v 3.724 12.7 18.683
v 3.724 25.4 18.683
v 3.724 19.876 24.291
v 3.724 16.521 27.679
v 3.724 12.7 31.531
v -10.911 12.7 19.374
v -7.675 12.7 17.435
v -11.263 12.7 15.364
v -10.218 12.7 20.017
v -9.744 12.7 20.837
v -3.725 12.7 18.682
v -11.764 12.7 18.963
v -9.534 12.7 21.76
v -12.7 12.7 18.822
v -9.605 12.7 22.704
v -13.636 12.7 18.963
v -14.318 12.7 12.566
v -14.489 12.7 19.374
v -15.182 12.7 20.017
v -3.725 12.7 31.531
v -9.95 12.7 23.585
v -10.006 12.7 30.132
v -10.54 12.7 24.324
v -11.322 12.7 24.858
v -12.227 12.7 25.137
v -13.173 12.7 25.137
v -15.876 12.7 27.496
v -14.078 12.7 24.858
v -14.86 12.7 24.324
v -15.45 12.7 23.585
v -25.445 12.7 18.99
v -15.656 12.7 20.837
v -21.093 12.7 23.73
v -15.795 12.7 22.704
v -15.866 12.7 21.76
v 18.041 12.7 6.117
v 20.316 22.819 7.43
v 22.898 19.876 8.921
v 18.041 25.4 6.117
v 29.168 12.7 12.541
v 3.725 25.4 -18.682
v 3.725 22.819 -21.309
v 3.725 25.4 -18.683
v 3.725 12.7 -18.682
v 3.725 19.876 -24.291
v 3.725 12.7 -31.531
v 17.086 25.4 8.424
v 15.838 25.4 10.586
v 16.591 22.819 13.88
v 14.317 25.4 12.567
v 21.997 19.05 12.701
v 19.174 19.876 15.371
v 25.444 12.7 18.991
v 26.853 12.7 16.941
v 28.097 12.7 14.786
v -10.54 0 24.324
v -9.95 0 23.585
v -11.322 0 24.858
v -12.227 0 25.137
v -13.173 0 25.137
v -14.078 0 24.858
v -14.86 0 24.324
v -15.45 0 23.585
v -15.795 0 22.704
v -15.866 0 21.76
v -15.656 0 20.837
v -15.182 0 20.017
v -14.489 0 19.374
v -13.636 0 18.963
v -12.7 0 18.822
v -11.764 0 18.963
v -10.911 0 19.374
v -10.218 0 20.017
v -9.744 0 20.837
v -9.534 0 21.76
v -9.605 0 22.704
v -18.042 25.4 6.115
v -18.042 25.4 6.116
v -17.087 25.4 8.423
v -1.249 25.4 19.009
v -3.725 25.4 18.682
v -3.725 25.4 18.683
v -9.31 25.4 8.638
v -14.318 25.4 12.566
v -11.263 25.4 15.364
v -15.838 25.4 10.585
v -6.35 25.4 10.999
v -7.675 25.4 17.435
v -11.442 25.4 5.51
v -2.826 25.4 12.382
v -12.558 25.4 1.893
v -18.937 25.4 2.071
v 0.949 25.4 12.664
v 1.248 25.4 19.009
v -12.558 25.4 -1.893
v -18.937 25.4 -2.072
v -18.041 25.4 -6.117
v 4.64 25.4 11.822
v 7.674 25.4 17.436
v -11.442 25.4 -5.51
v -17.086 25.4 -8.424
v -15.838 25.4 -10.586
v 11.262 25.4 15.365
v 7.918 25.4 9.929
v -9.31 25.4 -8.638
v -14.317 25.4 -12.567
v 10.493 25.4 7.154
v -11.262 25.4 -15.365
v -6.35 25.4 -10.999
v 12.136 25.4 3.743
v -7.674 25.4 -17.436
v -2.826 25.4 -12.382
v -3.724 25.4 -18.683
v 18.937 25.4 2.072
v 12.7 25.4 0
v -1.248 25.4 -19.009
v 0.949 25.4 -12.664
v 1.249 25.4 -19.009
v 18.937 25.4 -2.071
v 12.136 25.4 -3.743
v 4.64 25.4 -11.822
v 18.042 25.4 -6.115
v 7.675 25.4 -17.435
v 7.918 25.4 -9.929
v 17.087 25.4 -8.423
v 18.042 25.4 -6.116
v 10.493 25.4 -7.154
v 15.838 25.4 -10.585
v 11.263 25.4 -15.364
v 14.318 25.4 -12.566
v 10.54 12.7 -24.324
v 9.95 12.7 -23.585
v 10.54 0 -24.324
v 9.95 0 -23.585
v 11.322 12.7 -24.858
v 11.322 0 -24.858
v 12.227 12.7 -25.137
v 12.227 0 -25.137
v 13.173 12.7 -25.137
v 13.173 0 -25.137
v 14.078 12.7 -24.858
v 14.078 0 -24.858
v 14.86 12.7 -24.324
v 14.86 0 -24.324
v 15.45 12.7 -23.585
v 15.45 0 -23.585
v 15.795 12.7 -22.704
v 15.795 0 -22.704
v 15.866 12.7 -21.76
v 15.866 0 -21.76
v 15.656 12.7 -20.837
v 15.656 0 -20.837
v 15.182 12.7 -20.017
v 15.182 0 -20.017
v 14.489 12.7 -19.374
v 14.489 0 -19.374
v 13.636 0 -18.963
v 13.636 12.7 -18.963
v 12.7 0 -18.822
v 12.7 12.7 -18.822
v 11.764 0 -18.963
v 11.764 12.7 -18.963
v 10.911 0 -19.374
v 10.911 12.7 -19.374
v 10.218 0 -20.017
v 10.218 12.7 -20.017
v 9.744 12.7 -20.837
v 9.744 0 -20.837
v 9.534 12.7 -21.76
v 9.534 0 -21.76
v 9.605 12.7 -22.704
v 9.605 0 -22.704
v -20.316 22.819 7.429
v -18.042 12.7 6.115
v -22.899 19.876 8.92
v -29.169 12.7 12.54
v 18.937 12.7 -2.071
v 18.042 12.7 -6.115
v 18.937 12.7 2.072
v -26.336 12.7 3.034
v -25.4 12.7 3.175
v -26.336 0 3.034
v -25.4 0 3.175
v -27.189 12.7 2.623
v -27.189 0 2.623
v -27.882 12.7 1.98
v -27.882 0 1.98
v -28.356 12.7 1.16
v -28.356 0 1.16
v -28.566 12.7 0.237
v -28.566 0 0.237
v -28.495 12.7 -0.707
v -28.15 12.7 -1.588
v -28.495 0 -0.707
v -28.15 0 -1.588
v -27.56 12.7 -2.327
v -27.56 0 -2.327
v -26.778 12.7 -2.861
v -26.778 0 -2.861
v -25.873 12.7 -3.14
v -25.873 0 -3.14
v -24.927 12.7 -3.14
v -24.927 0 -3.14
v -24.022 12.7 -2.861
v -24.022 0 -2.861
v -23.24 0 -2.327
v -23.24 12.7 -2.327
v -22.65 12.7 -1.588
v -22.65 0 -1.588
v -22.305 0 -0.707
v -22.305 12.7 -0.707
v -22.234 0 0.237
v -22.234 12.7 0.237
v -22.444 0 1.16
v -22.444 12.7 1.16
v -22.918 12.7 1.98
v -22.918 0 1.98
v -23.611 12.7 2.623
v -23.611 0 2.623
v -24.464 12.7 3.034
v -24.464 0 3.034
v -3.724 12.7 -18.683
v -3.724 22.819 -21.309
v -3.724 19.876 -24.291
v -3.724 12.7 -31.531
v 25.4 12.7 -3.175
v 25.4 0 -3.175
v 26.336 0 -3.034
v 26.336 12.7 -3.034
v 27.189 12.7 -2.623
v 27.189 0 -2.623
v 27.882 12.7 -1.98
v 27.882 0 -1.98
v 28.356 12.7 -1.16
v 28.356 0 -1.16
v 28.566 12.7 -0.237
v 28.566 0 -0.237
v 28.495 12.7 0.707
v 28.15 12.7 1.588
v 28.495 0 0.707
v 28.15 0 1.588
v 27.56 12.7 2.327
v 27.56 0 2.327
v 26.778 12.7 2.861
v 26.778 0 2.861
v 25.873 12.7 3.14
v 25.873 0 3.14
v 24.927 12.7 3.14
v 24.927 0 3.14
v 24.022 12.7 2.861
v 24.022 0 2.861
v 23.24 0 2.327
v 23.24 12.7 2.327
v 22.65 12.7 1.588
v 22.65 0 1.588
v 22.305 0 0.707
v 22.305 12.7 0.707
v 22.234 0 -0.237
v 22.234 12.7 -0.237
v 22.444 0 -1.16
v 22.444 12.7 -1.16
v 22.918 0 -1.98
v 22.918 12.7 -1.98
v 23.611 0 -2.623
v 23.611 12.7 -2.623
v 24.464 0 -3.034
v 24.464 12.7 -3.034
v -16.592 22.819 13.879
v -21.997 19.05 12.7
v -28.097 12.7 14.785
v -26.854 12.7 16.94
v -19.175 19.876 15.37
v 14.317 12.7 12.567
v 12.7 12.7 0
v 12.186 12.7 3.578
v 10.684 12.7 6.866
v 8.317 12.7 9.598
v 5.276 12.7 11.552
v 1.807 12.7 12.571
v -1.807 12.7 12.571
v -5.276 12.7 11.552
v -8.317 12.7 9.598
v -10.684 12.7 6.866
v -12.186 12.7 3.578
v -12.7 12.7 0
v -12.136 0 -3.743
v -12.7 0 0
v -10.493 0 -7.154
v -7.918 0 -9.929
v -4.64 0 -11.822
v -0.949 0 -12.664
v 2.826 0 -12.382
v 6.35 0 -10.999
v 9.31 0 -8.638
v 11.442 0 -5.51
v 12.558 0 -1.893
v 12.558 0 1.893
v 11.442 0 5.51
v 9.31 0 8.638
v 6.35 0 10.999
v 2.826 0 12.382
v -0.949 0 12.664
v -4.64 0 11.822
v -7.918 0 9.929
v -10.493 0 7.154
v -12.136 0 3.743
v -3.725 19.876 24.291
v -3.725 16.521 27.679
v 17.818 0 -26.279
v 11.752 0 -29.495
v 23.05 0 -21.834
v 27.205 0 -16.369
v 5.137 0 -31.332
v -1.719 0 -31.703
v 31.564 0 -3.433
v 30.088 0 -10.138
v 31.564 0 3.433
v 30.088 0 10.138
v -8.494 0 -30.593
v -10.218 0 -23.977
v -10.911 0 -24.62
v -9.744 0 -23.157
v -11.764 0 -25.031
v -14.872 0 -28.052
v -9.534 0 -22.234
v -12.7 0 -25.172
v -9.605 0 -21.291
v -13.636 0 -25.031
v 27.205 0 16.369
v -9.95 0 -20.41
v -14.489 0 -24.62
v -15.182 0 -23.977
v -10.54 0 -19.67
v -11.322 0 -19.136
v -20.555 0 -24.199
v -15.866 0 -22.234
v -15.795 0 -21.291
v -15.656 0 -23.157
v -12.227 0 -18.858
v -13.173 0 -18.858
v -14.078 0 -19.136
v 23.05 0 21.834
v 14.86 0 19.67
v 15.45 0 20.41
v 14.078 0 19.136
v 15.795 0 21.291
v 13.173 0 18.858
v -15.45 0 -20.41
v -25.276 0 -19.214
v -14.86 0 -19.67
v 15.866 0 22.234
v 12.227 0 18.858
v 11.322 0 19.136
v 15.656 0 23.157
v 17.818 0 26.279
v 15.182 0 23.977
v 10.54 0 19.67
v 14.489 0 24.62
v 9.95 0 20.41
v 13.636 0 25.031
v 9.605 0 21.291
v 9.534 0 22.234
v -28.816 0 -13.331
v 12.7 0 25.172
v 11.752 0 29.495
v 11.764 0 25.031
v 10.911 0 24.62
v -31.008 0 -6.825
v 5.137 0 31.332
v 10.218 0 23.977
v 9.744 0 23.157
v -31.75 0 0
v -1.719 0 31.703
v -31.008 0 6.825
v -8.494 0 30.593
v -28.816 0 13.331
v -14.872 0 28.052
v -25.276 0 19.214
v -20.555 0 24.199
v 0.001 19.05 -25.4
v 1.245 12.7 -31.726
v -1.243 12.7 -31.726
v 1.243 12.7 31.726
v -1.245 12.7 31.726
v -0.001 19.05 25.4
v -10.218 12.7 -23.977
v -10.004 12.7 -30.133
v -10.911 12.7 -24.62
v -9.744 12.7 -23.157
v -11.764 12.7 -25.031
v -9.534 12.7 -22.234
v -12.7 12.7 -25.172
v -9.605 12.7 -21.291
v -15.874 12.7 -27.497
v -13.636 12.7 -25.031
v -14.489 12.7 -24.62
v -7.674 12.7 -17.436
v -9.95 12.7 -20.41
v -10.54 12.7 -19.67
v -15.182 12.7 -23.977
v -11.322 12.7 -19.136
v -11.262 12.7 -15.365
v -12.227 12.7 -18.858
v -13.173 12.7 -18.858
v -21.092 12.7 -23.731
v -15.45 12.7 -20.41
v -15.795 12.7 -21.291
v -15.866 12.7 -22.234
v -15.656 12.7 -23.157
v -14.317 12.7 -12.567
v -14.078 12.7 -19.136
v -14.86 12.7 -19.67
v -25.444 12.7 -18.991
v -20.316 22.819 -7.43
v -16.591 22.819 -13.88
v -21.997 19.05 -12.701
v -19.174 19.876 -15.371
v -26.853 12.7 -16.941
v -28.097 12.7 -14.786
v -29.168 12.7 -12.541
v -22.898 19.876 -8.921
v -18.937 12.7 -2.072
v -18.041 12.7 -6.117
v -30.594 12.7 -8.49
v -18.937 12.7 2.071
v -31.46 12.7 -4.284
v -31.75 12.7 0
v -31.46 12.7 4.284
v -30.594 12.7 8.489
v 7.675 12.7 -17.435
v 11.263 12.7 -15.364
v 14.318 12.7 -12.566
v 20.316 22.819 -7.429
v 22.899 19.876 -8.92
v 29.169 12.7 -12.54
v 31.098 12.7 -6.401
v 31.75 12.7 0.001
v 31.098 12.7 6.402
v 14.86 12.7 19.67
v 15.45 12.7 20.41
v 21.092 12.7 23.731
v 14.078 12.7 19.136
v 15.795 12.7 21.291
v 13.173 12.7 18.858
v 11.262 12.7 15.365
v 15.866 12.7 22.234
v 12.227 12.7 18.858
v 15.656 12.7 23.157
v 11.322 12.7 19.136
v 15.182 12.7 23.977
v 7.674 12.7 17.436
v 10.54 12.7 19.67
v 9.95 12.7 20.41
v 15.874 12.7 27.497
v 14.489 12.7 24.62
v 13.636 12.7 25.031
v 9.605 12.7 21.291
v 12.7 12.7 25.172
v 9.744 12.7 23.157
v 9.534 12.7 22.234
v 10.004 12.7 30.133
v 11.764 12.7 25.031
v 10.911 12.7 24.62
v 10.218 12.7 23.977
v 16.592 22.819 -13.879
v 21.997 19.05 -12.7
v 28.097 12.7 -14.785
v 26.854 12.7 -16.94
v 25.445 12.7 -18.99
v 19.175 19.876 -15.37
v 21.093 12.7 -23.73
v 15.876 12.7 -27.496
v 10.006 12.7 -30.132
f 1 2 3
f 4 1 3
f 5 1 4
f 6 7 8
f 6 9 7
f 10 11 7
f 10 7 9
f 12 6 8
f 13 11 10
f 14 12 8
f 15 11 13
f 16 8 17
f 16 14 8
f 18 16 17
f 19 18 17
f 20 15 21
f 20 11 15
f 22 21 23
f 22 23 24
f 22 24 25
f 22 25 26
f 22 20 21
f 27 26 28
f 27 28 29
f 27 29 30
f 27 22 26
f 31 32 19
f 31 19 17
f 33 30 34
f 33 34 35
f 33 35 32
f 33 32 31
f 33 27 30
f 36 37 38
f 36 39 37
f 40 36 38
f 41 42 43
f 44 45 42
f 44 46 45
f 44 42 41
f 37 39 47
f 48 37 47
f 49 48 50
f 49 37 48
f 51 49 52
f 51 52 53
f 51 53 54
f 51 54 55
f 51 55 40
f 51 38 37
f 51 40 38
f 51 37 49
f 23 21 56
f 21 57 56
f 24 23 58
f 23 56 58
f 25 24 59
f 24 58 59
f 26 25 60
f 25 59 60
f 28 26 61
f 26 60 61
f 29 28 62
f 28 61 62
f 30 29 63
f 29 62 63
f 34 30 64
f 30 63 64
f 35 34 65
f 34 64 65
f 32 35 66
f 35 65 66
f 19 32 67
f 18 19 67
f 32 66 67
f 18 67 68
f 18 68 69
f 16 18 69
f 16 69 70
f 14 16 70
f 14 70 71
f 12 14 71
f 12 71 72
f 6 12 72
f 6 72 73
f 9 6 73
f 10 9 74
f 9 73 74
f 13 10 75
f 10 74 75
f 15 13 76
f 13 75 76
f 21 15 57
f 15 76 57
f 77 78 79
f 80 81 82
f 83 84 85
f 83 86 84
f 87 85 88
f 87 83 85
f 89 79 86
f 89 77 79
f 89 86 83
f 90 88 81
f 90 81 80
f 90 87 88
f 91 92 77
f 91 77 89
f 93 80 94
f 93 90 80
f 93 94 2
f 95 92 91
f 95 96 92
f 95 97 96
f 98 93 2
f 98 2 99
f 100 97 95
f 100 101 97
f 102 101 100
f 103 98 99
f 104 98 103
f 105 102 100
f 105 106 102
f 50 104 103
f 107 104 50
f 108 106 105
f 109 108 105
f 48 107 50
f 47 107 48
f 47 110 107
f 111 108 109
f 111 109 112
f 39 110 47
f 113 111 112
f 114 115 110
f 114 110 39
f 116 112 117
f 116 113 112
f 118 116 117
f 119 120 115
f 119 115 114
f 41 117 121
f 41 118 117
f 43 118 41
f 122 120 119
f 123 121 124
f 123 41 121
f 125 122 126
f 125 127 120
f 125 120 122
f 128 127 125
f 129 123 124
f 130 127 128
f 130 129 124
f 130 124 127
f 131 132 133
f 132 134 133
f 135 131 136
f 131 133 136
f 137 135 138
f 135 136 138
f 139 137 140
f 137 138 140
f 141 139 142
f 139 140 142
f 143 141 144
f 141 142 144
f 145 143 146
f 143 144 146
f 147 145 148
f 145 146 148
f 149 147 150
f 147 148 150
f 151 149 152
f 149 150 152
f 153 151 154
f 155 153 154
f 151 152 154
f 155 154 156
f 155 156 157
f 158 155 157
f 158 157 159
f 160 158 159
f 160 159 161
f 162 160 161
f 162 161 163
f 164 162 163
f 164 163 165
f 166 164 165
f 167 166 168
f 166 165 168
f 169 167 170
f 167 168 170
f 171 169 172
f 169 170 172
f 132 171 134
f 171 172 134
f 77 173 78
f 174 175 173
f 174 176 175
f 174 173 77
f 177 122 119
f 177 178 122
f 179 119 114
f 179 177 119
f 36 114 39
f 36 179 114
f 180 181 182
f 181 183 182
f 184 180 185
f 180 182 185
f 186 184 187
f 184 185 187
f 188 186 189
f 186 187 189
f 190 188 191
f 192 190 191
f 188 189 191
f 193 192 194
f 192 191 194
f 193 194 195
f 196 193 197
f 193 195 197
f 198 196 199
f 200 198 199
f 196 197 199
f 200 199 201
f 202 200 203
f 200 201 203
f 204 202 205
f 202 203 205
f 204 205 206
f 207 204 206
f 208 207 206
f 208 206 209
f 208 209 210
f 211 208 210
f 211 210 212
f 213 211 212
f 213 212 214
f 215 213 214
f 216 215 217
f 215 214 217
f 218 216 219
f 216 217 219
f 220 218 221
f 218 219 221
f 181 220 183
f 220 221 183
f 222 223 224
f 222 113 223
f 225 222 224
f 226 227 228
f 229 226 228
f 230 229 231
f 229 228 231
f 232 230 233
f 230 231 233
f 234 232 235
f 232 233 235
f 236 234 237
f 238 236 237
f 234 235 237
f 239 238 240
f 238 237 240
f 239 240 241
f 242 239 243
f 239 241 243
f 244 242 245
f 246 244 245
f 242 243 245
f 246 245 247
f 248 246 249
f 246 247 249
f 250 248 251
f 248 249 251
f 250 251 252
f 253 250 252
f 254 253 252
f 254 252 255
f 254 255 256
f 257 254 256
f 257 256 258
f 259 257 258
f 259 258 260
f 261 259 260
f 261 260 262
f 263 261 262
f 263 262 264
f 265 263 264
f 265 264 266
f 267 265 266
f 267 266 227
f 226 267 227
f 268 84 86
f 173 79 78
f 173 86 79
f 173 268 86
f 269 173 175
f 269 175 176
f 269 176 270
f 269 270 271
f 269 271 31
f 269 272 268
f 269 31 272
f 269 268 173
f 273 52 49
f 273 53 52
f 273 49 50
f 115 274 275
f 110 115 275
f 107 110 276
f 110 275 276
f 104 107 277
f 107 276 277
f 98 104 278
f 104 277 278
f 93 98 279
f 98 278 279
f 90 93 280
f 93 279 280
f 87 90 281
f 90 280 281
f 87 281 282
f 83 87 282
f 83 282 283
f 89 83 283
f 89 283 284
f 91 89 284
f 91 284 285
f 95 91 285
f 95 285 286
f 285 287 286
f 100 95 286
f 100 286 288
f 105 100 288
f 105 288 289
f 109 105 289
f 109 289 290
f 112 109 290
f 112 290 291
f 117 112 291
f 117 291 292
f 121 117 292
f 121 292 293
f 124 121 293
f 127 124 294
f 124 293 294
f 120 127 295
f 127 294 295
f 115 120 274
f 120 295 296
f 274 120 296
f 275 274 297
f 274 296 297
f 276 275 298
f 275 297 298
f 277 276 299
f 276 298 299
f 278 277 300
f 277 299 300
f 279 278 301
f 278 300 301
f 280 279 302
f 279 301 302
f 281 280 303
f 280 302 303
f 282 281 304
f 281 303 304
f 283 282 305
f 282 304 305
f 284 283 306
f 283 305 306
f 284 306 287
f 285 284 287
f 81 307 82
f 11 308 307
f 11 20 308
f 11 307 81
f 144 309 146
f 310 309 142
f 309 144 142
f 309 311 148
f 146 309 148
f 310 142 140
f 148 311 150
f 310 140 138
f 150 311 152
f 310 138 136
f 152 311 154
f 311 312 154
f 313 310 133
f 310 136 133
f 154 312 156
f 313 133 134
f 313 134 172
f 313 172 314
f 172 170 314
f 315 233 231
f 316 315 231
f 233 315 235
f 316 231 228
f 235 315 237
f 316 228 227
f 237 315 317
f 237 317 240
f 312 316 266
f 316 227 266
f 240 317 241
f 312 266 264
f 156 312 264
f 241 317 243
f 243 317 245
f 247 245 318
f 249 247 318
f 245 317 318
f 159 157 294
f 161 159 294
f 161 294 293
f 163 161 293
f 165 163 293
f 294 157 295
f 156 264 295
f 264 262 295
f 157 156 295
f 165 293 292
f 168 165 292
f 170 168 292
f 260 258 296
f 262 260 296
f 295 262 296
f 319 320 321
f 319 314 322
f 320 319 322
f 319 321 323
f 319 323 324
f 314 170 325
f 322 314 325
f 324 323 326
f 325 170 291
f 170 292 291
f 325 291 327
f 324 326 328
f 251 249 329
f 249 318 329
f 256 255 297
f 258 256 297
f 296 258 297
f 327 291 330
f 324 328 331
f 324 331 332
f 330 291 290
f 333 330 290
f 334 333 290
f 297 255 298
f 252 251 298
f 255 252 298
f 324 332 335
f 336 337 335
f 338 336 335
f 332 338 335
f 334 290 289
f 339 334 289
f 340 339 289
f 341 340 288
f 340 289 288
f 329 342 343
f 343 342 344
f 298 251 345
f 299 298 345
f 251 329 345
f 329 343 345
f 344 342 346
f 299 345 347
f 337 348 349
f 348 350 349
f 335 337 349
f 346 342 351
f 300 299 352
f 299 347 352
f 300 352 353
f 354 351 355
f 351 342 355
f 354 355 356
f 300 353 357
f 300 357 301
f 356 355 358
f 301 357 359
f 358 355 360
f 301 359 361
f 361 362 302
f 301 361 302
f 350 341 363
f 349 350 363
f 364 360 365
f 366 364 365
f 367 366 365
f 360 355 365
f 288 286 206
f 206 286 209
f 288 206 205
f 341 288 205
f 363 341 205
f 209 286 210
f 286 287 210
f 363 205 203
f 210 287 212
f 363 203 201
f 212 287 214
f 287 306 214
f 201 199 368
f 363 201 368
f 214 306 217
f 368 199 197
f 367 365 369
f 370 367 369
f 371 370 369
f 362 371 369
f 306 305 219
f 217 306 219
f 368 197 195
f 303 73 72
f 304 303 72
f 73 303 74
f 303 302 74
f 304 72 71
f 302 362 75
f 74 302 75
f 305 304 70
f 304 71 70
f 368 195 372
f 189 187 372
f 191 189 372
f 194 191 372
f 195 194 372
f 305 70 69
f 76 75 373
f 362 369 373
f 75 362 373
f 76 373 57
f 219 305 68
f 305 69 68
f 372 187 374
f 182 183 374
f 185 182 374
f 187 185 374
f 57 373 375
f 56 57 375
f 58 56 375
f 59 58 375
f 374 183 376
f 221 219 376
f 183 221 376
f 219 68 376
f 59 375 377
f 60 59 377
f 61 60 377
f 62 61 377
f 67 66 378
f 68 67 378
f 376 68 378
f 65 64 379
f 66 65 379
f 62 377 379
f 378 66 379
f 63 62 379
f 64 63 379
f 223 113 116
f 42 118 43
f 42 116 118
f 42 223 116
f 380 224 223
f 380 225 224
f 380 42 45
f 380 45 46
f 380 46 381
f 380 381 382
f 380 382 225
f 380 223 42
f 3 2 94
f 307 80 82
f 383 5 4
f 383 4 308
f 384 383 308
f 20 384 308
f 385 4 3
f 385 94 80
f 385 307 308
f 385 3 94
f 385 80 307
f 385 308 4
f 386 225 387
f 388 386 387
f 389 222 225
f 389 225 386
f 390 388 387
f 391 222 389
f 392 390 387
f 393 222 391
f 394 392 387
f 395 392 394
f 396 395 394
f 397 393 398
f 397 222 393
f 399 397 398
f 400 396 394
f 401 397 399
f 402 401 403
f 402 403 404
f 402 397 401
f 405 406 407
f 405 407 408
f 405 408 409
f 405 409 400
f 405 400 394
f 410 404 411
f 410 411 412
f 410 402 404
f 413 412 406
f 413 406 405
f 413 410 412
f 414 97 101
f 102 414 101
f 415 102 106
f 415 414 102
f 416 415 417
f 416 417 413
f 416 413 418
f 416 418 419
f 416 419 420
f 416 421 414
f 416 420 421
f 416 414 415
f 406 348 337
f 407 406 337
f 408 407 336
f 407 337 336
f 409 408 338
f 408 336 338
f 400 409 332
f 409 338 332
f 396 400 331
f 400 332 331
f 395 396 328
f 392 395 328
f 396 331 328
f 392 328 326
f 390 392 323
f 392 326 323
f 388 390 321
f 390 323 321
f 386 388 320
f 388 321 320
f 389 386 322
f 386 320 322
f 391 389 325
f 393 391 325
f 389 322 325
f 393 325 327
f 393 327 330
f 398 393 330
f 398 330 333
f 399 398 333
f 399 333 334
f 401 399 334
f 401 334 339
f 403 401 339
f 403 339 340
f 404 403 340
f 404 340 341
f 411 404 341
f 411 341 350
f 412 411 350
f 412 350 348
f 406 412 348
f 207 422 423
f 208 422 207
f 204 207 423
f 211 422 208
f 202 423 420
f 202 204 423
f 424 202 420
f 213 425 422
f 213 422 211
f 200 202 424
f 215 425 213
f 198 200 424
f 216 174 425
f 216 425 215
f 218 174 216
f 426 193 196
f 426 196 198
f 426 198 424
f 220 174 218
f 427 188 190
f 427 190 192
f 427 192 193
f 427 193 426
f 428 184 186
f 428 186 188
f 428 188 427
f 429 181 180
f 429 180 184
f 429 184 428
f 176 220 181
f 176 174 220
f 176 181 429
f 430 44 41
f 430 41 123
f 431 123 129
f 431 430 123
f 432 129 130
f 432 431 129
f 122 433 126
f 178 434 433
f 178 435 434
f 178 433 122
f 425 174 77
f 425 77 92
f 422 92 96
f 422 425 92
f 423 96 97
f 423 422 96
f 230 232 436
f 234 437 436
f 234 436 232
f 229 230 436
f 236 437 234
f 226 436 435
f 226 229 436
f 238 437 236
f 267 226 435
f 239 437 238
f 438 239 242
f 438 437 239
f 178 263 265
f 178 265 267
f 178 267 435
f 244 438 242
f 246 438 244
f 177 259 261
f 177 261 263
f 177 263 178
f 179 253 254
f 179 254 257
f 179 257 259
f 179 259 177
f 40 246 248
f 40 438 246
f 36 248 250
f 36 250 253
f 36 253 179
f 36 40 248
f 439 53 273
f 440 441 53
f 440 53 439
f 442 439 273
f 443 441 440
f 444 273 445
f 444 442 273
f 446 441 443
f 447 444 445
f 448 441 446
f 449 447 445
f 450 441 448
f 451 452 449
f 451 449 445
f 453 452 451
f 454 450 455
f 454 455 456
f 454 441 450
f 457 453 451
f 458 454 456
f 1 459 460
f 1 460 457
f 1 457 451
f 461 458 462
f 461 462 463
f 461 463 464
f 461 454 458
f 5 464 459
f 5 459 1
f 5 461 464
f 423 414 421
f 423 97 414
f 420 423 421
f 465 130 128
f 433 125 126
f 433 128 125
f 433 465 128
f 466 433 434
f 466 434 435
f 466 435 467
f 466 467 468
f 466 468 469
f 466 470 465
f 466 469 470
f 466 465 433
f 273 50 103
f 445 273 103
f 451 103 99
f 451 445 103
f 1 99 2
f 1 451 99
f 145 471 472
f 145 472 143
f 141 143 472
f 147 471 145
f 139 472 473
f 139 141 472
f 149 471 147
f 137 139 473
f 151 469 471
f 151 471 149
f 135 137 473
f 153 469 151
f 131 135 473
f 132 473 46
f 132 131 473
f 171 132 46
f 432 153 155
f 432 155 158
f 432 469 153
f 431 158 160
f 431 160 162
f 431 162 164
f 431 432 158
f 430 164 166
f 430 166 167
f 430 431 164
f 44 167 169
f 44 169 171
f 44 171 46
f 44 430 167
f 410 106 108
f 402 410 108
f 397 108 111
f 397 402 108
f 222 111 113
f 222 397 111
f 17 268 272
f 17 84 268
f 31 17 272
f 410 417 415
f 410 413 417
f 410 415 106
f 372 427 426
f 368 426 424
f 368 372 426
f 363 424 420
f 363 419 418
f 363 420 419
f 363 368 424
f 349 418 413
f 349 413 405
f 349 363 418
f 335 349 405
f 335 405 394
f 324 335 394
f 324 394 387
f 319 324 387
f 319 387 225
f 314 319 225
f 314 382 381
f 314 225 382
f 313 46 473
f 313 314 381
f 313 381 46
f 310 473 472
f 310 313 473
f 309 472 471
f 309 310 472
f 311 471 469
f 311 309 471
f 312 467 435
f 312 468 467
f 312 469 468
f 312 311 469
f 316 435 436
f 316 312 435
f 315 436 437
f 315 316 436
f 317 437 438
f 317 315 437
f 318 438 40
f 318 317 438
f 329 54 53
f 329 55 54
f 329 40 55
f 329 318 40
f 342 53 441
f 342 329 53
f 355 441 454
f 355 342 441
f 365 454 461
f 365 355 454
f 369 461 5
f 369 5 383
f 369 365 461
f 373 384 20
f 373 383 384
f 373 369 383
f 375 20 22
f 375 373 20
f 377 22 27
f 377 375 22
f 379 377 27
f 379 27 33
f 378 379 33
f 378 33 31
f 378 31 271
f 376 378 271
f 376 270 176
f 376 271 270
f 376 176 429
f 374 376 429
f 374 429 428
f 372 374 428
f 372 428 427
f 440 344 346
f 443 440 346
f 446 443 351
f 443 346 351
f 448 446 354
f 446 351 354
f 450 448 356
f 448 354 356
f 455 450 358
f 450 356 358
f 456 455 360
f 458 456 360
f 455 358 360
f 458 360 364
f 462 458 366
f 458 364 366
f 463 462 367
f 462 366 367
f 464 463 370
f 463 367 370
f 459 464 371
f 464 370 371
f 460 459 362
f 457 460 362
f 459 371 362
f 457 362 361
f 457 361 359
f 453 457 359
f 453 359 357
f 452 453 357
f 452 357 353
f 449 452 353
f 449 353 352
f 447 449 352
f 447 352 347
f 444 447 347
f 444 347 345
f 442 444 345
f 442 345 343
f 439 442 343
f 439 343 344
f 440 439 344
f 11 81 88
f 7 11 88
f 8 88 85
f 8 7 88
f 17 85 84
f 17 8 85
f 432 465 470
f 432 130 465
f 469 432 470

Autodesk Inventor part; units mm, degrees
ref_plane "YZ Plane" through (0, 0, 0) normal (1, 0, 0) x (0, 1, 0)
ref_plane "XZ Plane" through (0, 0, 0) normal (0, 1, 0) x (-1, 0, 0)
ref_plane "XY Plane" through (0, 0, 0) normal (0, 0, 1) x (1, 0, 0)
sketch "Sketch1" plane through (0, 0, 0) normal (0, 1, 0) x (-1, 0, 0)
  circle A0 centre (0, 0) radius 12.7
  circle A1 centre (0, 0) radius 31.75
  dimension "d0" = 25.4
  dimension "d1" = 63.5
extrude "Extrusion1" add sketch "Sketch1" along normal blind 12.7
sketch "Sketch2" plane through (0, 12.7, 0) normal (0, 1, 0) x (1, 0, 0)
  circle A0 centre (0, 0) radius 19.05
  circle A1 centre (0, 0) radius 31.75 construction
  line L0 (-31.75, 0) -> (-19.05, 0) construction
  circle A2 centre (-25.4, 0) radius 2.5473
  circle A3 centre (0, 0) radius 12.7 projected
  dimension "d5" = 38.1
extrude "Extrusion2" add sketch "Sketch2" along normal blind 12.7 contours A0
sketch "Sketch3" plane through (0, 12.7, 0) normal (0, 1, 0) x (1, 0, 0)
  line L0 (-31.75, 0) -> (-19.05, 0) construction
  circle A0 centre (-25.4, 0) radius 2.5473 projected
  point P0 (0, 0)
hole "Hole1" at (-25.4, 12.7, 0) direction (0, -1, 0) diameter 6.35 end through all
pattern_circular "Circular Pattern1" count 6 over 360 about axis through (0, 0, 0) along (0, 1, 0) of "Hole1"
sketch "Sketch4" plane through (0, 12.7, 0) normal (0, 1, 0) x (1, 0, 0)
  circle A0 centre (0, 0) radius 19.05 projected
  line L0 (3.7235, -18.6826) -> (3.7235, -31.5309)
  arc A1 (-3.7247, -31.5309) -> (3.7235, -31.5309) centre (-0.0006, 0.0104) ccw
  line L1 (-3.7247, -31.5309) -> (-3.7247, -18.6823)
extrude "Extrusion3" add sketch "Sketch4" along normal blind 12.7 contours A0 L0 A1 L1
chamfer "Chamfer1" distance 12.7 angle 45 1 edges at (-0.0006, 25.4, 31.75)
pattern_circular "Circular Pattern2" count 6 over 360 about axis through (0, 0, 0) along (0, 1, 0) of "Extrusion3", "Chamfer1"
properties part number "pegg"
